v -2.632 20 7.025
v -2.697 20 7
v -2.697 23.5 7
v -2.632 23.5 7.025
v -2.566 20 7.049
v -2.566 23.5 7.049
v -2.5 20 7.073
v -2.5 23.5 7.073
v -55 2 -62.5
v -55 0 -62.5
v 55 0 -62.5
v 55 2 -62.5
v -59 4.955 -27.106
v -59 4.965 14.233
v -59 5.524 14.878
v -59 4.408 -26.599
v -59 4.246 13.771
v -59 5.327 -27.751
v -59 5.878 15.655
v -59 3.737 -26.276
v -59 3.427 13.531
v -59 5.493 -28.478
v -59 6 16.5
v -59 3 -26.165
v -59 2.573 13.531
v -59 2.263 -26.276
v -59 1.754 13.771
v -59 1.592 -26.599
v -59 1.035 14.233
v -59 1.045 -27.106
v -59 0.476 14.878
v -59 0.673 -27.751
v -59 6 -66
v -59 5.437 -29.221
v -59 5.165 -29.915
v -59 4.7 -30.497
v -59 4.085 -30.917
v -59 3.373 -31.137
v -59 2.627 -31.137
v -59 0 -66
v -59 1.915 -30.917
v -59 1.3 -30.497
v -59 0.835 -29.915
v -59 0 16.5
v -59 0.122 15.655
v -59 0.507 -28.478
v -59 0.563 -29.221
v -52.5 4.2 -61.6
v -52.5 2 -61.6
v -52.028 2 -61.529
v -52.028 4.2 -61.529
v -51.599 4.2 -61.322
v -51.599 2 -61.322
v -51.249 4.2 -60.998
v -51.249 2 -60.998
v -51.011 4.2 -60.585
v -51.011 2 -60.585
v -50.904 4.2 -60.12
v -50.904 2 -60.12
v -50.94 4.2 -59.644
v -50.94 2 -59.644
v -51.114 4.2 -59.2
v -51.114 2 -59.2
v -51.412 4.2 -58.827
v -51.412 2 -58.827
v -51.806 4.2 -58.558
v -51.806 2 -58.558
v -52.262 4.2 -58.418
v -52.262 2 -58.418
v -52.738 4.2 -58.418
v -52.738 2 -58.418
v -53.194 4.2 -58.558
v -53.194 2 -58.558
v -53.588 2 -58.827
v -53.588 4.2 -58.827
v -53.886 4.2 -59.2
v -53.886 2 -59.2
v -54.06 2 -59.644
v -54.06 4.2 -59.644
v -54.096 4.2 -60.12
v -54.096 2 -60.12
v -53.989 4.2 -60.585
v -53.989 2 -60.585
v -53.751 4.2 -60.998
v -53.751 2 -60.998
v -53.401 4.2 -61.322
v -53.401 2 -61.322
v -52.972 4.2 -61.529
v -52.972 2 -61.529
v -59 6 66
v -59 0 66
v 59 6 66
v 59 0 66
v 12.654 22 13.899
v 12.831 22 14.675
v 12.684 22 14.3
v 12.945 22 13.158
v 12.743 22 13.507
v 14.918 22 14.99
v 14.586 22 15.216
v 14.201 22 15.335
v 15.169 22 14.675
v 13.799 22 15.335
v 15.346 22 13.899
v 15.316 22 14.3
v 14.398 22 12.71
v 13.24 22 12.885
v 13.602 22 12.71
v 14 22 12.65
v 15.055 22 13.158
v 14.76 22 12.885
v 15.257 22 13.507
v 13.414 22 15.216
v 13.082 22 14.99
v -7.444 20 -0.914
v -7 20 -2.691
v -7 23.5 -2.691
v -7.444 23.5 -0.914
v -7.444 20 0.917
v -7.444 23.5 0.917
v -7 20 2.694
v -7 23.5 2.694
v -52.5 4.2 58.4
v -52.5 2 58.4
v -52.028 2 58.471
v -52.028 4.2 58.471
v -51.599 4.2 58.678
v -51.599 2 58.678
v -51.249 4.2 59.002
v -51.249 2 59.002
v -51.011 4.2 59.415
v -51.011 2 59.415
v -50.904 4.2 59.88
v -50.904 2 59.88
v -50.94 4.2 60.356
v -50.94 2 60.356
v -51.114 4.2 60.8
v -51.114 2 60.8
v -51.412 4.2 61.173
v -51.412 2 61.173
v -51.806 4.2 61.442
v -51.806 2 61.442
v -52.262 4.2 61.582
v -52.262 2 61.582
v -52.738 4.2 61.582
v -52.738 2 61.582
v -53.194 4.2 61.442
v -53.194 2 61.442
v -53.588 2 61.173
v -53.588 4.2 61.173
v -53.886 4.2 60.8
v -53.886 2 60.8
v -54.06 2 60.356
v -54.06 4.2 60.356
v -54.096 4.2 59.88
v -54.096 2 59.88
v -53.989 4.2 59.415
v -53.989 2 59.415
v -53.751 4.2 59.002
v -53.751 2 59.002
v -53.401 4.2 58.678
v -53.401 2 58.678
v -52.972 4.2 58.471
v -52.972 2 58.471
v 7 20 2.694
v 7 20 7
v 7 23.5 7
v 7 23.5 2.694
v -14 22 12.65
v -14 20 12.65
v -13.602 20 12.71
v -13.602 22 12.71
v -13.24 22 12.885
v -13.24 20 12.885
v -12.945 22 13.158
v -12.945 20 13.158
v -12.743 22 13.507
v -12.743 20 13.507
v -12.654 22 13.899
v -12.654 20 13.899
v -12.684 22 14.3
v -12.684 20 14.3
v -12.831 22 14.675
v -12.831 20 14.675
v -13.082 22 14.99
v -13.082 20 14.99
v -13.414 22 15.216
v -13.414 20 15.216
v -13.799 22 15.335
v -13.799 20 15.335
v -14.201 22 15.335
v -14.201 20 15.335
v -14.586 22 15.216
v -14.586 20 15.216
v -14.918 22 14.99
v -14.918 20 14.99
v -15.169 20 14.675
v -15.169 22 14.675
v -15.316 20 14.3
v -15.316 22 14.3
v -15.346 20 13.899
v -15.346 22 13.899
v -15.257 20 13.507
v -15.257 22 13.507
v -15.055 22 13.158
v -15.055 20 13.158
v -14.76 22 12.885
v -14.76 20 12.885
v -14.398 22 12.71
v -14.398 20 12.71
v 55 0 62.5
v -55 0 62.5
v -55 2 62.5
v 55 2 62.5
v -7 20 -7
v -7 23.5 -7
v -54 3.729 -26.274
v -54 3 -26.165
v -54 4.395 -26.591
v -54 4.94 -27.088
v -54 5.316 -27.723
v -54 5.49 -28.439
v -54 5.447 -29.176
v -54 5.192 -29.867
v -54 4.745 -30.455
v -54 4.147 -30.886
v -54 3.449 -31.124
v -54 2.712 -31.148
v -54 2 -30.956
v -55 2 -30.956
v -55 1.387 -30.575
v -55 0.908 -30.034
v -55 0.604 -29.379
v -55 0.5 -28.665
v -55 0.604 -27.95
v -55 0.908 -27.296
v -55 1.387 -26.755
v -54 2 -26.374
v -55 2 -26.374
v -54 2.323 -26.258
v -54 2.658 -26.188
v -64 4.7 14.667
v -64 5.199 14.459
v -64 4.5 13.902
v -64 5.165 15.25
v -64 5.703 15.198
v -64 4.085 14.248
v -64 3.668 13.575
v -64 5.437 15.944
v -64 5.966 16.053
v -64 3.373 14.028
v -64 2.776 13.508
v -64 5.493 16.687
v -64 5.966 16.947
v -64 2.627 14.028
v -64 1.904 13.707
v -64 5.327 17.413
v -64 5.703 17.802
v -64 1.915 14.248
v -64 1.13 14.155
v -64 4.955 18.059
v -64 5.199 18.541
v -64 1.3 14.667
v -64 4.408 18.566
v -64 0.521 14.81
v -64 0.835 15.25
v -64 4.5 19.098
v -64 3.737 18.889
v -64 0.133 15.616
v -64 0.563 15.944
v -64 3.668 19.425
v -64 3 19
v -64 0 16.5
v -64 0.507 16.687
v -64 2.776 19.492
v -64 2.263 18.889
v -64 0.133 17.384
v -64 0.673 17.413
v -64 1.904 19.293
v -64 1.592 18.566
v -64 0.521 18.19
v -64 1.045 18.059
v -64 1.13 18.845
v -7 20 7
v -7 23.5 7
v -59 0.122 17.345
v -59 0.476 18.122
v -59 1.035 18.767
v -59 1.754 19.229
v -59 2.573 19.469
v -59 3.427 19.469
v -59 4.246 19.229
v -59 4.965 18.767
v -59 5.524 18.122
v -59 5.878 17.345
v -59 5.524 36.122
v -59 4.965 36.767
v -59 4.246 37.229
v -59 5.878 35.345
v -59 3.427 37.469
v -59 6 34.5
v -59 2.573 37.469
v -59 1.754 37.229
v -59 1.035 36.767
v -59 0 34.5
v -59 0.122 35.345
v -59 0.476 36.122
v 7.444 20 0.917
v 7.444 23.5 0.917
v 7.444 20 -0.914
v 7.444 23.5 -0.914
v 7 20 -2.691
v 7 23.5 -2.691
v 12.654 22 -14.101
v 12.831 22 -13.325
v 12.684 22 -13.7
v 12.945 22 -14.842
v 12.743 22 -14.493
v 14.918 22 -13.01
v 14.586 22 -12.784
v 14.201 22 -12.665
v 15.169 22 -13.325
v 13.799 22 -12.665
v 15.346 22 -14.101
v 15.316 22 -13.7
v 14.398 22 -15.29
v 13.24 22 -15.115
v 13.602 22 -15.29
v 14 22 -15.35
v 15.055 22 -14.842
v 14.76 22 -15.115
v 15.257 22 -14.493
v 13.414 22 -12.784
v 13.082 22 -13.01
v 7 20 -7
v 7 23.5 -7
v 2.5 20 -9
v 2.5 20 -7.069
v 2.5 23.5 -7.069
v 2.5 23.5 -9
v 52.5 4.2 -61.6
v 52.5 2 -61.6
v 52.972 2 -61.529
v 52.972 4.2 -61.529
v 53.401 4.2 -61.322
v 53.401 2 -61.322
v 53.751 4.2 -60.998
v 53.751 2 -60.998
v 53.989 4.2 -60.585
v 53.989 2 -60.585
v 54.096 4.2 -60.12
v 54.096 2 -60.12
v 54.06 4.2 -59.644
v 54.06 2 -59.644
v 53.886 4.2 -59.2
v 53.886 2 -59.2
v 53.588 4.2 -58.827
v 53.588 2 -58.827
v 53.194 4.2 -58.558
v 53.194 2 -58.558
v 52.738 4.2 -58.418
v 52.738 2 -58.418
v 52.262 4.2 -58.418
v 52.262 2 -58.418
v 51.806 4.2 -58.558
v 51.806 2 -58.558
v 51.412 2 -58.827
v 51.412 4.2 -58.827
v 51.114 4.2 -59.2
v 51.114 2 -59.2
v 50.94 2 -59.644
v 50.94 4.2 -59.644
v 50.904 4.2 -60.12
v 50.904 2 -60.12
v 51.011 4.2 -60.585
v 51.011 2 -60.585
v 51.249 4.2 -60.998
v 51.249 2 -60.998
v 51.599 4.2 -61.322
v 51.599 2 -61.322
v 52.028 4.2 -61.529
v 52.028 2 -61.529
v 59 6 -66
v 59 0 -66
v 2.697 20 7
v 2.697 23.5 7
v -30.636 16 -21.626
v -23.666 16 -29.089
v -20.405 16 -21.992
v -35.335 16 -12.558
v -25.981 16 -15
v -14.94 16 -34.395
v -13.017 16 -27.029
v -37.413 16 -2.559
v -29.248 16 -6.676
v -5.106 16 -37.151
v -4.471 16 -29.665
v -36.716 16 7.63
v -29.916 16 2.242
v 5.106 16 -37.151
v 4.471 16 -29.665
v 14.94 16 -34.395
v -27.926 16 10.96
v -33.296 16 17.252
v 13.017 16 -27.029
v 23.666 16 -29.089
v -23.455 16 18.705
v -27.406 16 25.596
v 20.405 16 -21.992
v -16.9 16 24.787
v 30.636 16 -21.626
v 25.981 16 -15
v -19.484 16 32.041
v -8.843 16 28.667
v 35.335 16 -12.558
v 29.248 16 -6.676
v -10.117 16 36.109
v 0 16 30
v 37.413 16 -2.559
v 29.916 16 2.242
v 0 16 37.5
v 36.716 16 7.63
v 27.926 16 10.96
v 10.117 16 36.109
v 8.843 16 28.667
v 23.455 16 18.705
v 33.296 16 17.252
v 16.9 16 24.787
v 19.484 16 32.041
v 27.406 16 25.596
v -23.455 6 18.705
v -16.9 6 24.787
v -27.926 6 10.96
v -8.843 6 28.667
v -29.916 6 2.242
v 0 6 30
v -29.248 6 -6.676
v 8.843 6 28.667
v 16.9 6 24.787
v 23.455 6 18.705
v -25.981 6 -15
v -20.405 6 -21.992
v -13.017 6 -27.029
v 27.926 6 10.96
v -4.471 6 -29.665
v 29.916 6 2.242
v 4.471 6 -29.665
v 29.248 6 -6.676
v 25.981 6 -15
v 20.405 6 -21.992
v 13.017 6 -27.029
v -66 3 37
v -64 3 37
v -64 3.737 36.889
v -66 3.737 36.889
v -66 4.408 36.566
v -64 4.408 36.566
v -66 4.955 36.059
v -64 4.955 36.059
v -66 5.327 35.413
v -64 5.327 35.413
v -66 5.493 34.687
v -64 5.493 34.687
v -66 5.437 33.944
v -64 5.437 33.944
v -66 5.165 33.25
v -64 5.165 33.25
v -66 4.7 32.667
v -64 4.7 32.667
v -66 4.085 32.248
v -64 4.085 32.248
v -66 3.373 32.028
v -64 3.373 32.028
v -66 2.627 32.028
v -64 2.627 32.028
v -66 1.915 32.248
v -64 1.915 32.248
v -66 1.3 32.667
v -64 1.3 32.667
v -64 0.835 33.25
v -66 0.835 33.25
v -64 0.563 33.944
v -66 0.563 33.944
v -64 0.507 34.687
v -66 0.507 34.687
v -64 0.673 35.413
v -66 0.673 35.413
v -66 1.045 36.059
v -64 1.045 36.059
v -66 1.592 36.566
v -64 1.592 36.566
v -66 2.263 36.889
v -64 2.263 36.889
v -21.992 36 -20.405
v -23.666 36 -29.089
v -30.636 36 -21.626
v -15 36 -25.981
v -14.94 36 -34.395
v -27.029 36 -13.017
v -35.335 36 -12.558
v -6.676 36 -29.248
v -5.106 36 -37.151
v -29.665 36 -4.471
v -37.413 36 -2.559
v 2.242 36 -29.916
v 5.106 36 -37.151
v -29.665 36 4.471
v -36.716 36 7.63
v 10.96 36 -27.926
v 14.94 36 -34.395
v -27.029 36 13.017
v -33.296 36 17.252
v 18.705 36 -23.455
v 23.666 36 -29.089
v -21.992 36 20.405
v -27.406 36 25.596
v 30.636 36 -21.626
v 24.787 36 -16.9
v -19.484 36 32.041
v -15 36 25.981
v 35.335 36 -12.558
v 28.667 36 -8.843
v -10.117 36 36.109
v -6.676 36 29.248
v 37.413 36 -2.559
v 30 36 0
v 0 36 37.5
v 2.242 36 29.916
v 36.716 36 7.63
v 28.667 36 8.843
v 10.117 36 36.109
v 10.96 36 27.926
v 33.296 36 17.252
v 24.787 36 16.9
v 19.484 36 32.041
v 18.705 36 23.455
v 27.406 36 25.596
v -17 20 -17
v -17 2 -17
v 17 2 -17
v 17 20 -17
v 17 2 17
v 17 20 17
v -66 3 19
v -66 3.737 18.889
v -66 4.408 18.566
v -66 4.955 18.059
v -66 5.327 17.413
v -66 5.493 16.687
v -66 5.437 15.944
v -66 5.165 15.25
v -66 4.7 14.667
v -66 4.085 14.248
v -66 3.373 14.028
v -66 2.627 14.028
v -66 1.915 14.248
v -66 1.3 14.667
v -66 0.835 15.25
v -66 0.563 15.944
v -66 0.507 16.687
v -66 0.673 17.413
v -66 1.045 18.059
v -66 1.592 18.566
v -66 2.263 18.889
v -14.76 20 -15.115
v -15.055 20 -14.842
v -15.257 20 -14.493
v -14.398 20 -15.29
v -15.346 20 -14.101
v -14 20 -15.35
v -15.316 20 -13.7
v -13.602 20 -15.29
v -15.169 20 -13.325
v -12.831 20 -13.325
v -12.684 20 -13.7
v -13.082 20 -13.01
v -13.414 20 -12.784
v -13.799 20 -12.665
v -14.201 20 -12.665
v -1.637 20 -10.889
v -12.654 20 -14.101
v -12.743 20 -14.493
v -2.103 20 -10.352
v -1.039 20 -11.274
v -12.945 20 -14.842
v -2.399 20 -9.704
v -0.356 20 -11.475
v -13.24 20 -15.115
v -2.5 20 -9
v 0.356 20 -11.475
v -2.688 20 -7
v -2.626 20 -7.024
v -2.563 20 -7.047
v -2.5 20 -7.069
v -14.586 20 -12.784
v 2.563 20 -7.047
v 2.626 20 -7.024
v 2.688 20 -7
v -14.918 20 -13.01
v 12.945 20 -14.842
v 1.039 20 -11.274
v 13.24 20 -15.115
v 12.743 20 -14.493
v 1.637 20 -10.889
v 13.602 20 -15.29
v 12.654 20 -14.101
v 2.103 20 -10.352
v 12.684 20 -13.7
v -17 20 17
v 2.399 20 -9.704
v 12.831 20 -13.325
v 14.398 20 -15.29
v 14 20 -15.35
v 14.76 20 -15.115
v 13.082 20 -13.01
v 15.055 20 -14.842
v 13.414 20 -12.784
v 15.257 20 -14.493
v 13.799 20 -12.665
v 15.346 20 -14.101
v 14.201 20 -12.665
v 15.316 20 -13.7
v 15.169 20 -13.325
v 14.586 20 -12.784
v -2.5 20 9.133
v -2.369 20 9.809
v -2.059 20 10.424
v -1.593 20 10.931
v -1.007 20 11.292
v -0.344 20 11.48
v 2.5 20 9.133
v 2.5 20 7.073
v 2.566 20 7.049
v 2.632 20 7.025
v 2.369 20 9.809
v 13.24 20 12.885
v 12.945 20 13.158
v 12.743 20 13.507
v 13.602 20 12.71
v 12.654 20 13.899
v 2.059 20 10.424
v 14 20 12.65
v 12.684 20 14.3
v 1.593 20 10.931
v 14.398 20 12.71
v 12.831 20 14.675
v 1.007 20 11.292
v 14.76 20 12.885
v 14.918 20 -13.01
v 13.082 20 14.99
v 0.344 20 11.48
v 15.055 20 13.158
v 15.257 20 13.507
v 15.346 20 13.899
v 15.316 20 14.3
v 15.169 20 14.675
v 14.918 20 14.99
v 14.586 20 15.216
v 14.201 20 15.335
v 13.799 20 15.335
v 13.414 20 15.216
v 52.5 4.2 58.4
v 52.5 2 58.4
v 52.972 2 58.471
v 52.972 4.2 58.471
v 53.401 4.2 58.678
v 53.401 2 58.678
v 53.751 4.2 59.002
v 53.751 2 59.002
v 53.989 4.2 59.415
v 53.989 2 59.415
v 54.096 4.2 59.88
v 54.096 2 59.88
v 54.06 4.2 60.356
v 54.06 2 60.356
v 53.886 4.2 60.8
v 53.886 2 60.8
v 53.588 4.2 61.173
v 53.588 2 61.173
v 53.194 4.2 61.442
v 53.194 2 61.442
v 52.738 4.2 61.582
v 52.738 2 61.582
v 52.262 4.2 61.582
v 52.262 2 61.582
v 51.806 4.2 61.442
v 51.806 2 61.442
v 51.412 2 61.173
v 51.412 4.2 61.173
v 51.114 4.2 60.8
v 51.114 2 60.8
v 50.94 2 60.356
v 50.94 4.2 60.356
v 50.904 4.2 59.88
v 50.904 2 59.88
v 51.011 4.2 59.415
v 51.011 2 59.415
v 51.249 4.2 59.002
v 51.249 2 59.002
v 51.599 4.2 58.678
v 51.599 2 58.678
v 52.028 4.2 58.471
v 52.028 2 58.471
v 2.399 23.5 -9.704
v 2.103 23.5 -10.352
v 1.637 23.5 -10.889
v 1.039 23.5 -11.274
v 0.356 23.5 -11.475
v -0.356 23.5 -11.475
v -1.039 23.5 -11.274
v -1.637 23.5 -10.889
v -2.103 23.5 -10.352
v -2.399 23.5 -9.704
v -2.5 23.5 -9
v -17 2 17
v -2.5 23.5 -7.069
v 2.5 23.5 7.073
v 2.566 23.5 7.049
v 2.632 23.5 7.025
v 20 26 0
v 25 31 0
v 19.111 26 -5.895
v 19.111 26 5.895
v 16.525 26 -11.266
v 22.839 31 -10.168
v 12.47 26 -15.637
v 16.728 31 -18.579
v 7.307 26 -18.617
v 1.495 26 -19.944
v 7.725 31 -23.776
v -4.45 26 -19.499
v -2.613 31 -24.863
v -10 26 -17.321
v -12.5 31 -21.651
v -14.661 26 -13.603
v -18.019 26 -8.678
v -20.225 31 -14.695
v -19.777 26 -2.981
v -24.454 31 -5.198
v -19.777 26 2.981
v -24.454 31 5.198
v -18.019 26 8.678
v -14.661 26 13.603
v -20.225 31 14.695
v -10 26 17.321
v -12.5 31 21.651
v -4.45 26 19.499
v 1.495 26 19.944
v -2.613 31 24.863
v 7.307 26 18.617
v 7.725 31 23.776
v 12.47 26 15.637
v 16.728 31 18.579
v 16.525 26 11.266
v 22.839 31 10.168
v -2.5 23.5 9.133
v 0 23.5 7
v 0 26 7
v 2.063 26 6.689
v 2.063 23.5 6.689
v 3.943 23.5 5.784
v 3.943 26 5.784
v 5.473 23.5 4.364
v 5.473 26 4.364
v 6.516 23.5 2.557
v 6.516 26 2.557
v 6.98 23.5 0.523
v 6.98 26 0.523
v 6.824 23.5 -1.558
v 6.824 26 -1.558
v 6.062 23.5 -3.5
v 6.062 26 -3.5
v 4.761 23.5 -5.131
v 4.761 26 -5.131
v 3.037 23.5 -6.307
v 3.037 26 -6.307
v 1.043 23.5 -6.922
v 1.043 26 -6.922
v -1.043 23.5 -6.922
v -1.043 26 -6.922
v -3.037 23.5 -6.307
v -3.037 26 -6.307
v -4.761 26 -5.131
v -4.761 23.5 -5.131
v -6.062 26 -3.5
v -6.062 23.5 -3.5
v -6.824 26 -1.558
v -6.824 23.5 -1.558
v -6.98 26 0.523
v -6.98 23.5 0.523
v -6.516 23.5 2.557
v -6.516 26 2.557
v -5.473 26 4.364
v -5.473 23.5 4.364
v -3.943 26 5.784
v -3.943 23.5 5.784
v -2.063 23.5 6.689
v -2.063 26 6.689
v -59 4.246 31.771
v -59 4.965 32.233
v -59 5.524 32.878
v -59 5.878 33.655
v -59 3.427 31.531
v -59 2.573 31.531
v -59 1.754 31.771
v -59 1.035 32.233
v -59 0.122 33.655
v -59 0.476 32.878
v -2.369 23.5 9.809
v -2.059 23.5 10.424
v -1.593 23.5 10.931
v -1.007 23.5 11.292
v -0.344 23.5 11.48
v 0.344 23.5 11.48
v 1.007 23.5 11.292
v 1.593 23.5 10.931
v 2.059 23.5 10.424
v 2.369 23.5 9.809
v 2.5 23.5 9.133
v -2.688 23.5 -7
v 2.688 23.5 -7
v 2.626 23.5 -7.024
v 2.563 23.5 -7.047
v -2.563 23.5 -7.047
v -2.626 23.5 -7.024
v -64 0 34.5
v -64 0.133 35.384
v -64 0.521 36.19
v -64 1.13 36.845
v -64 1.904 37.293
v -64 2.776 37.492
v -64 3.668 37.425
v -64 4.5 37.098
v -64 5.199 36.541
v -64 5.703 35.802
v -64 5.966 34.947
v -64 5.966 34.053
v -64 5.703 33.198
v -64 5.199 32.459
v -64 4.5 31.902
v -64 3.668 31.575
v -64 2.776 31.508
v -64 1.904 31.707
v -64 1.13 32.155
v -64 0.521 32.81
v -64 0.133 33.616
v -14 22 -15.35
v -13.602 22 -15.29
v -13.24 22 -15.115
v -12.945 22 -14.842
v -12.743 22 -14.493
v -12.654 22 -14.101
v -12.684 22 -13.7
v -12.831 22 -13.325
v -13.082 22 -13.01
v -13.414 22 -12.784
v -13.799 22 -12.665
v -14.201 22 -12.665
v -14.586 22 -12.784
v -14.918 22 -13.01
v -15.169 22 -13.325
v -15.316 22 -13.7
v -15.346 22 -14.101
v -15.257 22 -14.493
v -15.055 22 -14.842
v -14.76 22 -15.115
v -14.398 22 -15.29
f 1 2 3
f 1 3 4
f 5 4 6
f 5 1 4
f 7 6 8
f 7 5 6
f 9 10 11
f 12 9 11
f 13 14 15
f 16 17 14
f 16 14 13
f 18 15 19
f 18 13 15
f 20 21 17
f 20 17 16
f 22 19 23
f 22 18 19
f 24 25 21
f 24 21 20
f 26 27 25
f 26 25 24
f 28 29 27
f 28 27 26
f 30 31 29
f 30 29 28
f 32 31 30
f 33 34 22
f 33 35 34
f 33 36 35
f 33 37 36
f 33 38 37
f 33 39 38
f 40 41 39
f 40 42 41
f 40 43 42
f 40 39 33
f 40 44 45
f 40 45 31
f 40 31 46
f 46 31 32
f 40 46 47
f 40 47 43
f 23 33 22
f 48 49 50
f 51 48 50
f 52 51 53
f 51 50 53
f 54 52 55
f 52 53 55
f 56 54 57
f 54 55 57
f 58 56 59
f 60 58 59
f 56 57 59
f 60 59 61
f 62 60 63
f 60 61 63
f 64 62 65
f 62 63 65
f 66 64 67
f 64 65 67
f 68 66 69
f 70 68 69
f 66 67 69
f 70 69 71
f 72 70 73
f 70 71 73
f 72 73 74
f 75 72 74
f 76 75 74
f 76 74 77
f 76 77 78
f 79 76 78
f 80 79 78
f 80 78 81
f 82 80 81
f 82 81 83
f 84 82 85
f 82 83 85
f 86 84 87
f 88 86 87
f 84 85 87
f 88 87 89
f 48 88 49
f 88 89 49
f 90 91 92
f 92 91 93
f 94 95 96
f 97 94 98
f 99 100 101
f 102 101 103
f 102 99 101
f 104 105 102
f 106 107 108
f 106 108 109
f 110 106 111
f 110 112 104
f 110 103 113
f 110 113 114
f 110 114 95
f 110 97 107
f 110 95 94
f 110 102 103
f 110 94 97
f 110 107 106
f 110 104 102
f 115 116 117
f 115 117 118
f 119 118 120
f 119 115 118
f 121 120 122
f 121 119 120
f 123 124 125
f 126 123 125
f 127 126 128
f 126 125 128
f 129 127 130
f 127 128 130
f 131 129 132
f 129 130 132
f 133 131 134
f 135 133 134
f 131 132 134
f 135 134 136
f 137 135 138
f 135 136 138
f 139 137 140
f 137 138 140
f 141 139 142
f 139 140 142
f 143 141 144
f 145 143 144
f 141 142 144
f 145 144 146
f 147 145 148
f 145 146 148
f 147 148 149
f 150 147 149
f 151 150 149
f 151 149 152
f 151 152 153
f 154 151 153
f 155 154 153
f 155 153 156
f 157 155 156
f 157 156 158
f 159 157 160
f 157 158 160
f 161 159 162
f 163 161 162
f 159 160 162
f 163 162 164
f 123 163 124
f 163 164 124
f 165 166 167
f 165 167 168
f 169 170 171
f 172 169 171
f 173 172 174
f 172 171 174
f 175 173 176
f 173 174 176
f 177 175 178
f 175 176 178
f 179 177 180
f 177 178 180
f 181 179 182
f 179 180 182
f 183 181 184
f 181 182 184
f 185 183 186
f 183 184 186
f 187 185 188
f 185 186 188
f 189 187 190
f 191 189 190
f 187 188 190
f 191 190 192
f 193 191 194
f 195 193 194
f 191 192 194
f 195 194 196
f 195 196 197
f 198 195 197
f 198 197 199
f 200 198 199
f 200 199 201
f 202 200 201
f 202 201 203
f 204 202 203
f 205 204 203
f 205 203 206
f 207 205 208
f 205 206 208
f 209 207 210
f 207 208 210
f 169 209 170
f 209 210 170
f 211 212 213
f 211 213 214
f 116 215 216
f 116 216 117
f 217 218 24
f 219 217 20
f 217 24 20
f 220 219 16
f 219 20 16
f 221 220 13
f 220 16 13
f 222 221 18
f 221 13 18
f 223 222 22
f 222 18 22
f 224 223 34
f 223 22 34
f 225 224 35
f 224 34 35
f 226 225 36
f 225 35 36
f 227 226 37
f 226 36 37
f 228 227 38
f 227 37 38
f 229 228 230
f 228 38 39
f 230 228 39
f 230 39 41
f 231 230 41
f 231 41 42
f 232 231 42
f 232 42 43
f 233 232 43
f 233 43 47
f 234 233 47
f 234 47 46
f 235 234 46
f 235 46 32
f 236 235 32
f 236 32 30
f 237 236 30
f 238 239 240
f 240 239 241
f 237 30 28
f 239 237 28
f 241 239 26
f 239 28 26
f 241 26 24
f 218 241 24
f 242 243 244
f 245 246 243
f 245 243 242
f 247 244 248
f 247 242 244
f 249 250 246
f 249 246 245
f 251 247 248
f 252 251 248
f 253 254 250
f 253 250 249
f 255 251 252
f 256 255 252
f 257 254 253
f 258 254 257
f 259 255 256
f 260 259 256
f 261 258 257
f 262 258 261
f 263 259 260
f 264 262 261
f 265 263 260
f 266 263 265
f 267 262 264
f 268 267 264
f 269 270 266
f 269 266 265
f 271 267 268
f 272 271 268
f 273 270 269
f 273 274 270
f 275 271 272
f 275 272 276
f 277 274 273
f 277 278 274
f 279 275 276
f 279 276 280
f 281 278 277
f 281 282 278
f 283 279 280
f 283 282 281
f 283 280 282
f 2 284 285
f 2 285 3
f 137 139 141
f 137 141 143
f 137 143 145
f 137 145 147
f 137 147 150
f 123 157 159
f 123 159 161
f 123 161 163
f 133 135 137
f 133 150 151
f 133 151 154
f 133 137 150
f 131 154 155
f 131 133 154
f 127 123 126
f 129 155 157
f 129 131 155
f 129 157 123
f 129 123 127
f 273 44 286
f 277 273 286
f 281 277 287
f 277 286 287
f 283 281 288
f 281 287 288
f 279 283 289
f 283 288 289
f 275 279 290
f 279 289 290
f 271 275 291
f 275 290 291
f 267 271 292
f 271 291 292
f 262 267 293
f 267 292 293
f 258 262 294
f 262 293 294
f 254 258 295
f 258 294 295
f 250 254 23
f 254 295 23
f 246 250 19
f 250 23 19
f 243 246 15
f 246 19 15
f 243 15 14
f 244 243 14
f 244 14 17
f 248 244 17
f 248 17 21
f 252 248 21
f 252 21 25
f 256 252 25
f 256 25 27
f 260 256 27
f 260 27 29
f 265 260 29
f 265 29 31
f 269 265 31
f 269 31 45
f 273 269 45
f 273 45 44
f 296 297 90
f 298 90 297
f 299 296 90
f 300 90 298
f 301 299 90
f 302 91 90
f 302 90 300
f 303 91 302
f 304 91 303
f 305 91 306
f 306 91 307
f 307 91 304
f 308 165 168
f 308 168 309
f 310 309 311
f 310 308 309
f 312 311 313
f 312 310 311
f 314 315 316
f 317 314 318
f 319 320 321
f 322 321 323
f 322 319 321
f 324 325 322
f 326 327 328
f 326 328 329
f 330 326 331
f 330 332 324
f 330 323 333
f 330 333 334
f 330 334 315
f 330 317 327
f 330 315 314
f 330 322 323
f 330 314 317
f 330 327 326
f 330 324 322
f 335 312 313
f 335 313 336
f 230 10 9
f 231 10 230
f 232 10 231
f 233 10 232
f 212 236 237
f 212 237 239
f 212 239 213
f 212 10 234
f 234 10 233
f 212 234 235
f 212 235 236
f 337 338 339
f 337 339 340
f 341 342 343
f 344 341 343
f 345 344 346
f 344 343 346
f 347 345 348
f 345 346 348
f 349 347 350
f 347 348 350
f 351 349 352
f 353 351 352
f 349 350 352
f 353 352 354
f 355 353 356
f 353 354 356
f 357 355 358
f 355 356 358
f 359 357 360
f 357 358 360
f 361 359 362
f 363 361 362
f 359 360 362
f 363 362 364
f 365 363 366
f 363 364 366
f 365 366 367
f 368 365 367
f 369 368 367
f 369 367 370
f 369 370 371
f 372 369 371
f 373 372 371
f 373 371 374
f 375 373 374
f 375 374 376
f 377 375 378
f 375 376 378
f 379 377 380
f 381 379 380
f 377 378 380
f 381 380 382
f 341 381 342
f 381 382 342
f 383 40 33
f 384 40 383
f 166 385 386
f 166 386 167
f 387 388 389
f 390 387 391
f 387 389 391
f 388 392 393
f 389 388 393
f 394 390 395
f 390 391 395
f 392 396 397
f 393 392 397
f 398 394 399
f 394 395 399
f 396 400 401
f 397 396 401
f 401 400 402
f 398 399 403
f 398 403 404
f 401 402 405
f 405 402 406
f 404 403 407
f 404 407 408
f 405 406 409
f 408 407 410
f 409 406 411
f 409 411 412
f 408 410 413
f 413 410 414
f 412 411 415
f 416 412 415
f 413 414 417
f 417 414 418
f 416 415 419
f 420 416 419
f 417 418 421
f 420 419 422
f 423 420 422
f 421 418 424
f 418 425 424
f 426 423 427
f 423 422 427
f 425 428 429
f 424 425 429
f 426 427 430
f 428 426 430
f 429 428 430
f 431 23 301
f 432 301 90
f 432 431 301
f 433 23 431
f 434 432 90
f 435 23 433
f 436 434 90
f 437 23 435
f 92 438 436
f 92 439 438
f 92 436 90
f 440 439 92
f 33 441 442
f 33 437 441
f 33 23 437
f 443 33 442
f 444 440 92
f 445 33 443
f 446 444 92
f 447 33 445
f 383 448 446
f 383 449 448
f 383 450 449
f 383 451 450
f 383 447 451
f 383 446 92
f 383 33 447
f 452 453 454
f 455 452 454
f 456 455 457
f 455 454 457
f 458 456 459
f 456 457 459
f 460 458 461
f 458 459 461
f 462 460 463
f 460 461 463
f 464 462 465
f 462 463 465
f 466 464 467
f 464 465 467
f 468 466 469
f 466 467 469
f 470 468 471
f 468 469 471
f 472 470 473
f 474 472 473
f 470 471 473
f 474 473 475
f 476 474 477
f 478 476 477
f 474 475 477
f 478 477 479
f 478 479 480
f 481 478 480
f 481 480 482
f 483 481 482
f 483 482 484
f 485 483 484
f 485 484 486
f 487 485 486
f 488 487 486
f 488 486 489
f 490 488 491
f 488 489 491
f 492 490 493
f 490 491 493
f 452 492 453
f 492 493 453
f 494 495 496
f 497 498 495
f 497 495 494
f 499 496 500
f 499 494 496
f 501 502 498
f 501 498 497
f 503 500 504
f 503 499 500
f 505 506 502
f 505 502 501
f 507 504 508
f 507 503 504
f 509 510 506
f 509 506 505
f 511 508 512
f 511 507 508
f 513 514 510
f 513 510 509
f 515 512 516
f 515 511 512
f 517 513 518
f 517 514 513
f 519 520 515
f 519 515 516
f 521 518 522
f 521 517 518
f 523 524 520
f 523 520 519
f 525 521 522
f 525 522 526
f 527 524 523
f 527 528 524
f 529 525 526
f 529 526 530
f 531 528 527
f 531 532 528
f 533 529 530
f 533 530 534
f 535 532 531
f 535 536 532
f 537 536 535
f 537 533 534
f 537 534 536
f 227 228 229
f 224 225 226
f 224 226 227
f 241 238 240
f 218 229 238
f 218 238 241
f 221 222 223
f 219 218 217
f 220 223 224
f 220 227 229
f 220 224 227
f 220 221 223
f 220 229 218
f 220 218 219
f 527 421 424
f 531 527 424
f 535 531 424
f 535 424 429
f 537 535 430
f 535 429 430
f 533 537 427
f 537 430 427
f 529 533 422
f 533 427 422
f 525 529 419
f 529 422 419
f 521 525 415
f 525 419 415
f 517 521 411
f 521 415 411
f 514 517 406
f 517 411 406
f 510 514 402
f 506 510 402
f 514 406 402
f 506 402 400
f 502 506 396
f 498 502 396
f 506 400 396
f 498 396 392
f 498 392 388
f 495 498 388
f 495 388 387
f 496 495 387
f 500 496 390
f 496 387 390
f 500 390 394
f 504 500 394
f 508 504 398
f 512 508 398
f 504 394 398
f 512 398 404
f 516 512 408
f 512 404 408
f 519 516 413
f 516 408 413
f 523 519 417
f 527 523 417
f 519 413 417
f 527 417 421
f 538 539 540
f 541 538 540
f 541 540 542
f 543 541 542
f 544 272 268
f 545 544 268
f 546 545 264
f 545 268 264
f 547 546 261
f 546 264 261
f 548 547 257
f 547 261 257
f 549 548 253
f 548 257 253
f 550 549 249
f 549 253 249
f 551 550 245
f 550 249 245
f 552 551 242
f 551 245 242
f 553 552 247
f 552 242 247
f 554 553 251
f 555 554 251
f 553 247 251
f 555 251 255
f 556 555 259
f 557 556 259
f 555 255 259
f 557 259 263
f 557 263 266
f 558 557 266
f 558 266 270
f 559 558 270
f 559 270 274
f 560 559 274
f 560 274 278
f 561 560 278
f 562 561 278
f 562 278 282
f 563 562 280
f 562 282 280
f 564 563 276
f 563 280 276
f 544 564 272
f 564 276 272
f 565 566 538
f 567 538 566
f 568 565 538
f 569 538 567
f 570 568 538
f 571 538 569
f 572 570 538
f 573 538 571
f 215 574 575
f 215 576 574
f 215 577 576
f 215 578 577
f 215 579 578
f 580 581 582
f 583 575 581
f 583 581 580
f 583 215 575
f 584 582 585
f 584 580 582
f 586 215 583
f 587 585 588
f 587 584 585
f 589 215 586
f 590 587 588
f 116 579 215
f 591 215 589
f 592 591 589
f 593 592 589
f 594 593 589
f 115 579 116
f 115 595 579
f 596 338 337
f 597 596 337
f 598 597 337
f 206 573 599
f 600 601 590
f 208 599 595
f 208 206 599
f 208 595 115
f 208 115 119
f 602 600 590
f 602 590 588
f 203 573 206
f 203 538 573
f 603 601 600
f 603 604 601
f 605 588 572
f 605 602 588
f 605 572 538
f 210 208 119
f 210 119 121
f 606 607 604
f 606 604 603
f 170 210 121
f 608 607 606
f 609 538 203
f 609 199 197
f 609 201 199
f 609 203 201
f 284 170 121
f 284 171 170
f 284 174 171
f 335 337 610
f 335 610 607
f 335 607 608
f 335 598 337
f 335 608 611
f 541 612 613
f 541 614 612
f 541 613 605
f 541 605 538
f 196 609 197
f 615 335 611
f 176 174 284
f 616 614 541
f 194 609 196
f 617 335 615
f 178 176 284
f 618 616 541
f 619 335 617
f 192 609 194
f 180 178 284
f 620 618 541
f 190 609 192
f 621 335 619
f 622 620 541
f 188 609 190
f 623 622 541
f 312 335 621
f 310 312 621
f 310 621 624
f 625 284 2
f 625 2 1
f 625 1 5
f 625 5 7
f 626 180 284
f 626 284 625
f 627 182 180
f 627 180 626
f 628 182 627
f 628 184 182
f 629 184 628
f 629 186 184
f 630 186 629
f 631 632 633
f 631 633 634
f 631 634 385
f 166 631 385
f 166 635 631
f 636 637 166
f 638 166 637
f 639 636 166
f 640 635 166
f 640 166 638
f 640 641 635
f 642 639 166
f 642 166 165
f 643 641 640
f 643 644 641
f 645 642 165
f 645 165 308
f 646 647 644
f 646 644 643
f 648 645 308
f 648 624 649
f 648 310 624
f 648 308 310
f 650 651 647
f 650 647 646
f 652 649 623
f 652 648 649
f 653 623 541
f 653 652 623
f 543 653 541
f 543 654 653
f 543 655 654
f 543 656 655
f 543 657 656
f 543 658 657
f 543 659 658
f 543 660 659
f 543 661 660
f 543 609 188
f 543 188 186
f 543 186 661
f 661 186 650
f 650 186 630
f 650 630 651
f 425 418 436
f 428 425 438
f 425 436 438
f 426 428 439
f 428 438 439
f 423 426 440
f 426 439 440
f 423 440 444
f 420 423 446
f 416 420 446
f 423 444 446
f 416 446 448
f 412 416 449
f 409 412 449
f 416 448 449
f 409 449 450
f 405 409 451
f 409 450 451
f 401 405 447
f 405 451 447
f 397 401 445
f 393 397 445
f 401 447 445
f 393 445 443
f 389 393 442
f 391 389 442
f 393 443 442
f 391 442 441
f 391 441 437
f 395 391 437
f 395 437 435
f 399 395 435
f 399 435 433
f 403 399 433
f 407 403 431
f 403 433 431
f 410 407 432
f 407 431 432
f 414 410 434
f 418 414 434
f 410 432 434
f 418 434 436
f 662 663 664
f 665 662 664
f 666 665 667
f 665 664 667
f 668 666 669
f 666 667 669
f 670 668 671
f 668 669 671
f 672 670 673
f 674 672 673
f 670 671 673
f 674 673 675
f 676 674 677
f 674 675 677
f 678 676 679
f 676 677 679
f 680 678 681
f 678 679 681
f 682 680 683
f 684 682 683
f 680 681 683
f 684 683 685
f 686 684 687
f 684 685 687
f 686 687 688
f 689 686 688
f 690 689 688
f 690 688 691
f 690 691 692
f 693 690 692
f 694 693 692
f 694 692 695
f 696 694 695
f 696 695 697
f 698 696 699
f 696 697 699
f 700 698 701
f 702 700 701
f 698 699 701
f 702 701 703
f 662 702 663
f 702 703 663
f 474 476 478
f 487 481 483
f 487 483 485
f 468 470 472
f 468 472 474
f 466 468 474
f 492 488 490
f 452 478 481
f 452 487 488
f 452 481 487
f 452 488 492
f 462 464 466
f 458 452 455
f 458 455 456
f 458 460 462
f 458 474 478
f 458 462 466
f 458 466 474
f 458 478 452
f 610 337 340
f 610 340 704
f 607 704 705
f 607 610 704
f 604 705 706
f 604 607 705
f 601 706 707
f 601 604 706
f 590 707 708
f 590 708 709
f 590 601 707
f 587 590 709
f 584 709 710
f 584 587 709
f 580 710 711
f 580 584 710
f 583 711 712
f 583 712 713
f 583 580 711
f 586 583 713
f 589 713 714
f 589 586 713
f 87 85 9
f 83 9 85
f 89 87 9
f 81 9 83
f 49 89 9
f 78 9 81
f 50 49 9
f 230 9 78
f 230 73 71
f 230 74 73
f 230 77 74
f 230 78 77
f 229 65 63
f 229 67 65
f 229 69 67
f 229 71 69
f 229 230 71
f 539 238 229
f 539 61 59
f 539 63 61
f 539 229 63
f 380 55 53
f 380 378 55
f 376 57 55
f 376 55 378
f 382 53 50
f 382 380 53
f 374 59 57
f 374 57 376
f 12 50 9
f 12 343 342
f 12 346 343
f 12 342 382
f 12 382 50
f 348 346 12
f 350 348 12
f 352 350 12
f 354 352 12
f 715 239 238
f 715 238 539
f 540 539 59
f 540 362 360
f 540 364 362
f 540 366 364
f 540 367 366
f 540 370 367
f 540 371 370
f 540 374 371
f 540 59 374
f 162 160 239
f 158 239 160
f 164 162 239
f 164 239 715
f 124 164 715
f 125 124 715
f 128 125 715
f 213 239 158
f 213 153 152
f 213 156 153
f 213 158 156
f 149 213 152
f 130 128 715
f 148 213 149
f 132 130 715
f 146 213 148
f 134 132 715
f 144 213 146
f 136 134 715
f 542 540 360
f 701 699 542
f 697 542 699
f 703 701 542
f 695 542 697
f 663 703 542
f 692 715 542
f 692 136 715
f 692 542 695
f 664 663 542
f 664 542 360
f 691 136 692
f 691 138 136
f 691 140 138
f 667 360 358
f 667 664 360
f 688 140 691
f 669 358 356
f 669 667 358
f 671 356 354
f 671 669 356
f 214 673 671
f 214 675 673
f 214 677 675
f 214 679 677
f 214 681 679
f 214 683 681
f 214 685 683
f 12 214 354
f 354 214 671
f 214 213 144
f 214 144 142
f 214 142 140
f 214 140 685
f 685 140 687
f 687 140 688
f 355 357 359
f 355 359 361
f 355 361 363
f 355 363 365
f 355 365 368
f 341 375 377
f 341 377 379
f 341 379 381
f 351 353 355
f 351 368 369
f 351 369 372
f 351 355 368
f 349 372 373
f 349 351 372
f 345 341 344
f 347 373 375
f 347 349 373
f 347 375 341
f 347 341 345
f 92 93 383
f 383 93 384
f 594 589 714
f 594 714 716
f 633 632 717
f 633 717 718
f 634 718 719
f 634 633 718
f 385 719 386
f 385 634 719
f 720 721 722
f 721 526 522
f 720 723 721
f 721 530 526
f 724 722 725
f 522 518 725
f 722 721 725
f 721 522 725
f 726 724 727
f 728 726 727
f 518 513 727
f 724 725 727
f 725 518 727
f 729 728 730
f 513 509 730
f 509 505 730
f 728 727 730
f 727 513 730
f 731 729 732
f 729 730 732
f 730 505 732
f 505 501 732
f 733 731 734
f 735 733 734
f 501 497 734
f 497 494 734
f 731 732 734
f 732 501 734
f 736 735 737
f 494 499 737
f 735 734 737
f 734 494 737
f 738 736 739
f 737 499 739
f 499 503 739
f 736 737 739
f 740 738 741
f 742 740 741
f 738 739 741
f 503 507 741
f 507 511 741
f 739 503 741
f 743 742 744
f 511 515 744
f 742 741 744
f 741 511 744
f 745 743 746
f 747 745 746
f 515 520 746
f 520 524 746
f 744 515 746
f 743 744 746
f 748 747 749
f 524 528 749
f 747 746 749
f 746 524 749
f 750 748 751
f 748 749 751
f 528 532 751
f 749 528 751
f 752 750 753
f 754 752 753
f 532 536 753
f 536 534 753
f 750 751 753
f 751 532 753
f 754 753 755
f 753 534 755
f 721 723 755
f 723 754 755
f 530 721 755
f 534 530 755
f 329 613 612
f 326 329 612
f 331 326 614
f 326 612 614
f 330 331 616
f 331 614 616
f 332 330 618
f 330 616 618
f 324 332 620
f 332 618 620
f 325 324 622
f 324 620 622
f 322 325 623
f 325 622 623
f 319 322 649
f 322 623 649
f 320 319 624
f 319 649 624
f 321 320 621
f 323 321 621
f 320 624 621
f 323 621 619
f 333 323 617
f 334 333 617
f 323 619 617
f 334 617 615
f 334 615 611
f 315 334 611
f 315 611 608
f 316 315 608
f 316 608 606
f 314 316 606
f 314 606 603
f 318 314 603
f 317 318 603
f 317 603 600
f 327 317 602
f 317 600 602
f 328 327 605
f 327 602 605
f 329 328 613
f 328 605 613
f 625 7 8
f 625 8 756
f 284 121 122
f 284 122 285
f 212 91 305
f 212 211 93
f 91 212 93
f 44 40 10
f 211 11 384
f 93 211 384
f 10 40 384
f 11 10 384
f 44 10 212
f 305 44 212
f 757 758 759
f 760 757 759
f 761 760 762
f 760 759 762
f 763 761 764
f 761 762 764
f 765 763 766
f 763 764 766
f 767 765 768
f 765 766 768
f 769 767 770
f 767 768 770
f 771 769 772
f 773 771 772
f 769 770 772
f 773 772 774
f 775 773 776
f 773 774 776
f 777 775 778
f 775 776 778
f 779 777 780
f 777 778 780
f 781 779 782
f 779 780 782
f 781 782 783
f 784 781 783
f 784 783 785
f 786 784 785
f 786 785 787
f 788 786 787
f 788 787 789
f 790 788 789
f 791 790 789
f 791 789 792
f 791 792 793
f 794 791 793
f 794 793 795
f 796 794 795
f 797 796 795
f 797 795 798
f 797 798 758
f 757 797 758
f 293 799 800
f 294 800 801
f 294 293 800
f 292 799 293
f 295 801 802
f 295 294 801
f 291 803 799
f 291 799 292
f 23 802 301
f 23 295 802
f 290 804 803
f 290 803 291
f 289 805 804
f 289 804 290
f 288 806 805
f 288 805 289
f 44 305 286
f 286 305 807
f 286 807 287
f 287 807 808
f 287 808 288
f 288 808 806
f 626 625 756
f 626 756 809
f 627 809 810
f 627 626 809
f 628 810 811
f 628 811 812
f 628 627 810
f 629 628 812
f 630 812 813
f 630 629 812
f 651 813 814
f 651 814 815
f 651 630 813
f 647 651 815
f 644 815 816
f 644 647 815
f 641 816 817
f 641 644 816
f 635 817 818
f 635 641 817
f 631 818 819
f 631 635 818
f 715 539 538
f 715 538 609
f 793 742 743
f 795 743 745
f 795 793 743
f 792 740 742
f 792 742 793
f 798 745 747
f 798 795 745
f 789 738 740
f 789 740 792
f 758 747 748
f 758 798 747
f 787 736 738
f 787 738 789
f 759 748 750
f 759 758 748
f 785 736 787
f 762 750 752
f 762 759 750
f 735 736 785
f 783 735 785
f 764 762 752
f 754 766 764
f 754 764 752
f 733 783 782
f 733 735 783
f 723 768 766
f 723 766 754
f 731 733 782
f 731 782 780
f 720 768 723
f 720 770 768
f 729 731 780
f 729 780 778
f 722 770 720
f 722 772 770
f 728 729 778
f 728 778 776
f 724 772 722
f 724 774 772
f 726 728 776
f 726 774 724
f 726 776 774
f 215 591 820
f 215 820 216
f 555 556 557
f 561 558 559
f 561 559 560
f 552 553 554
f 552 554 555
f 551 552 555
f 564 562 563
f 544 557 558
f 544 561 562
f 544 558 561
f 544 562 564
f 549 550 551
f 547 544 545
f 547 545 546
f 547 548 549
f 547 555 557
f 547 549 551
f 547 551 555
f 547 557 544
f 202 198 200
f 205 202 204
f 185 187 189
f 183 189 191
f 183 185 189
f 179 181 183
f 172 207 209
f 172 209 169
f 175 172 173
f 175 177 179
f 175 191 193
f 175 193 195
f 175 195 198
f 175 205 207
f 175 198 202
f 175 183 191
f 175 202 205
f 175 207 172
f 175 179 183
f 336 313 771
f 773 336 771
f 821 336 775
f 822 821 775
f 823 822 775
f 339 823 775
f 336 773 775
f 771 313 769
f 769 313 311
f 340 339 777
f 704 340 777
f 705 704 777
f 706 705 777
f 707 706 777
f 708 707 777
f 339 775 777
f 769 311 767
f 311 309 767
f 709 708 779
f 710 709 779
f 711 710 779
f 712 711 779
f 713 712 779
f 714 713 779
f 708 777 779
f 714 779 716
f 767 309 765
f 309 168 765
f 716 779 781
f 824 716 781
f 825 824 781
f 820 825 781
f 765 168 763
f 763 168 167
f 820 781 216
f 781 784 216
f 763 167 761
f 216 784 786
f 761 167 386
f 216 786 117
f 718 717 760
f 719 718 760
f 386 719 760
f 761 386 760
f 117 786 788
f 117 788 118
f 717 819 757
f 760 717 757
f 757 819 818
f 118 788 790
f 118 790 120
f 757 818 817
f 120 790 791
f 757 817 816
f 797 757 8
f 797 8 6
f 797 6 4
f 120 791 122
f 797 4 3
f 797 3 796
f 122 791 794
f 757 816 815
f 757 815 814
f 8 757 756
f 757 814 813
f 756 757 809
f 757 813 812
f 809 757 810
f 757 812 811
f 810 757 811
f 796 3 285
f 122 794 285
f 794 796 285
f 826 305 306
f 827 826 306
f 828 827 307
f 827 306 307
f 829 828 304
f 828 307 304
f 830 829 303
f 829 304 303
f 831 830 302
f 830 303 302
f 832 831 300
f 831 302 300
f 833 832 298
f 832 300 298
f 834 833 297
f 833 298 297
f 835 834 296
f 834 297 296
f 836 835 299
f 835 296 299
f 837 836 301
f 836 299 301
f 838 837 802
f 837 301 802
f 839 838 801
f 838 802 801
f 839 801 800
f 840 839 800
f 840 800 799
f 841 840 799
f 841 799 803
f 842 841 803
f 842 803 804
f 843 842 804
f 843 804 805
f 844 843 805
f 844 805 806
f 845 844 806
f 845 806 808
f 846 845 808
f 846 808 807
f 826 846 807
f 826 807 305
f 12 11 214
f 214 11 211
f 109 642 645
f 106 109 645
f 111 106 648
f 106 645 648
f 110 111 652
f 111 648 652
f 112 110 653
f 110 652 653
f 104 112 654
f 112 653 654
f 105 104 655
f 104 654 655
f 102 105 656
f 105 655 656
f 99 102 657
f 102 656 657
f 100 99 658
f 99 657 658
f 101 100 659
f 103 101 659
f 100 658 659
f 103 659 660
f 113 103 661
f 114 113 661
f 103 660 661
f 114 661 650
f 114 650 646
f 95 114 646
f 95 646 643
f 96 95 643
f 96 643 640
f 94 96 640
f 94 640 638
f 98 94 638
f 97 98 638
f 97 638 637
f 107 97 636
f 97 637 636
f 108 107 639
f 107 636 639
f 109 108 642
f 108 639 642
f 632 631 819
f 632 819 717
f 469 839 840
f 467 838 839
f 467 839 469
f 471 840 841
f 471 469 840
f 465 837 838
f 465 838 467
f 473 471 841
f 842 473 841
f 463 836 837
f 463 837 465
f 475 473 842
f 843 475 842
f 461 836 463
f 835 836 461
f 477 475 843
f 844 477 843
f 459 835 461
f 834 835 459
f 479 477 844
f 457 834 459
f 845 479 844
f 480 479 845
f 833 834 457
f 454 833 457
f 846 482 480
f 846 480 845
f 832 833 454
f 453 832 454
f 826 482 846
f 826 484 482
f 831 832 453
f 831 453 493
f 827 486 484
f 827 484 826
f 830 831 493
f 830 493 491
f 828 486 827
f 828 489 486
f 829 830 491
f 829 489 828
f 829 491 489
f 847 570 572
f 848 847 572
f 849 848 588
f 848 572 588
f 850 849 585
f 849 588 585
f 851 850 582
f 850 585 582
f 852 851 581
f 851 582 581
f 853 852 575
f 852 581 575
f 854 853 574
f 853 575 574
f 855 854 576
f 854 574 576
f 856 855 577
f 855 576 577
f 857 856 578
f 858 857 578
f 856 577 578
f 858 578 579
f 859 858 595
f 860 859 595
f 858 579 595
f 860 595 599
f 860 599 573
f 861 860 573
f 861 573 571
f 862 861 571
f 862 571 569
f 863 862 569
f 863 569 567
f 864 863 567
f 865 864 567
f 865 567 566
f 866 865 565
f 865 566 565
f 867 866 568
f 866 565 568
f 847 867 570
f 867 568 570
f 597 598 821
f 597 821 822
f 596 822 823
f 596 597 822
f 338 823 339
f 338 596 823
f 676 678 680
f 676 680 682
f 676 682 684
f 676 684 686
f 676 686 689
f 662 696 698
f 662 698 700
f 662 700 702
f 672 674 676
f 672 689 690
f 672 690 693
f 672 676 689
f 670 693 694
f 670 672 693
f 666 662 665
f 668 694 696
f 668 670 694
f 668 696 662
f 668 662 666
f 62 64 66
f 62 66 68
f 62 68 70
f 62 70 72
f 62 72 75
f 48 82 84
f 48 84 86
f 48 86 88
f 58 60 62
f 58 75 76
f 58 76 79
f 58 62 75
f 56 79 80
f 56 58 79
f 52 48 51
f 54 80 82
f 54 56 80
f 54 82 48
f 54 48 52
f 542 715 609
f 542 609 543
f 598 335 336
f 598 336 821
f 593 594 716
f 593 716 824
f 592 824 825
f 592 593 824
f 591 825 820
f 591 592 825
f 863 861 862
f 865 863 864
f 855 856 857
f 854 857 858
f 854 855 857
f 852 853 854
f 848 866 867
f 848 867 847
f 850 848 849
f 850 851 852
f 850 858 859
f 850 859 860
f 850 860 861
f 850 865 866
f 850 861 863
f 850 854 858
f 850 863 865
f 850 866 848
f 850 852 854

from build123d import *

# Parameters (mm, degrees)
SKETCH_1_W          = 118
SKETCH_1_H          = 132
EXTRUDE_1_DEPTH     = 6
SKETCH_2_W          = 110
SKETCH_2_H          = 125
CUT_EXTRUDE_1_DEPTH = 2
SKETCH_3_R          = 30
EXTRUDE_2_DEPTH     = 10
SKETCH_4_R          = 37.5
EXTRUDE_3_DEPTH     = 20
SKETCH_6_R          = 20
SKETCH_7_R          = 30
SKETCH_8_R          = 1.6
CUT_EXTRUDE_2_DEPTH = 2.2
SKETCH_10_W         = 34
SKETCH_10_H         = 34
CUT_EXTRUDE_3_DEPTH = 18
CUT_EXTRUDE_4_DEPTH = 3.5
SKETCH_12_R         = 7
CUT_EXTRUDE_5_DEPTH = 93.265920036
SKETCH_13_R         = 1.35
CUT_EXTRUDE_6_DEPTH = 2
SKETCH_14_R         = 3
EXTRUDE_4_DEPTH     = 5
SKETCH_15_R         = 2.5
EXTRUDE_5_DEPTH     = 2
SKETCH_16_R         = 2.5
CUT_EXTRUDE_7_DEPTH = 5


with BuildPart() as part:
    # 草图1 → 凸台-拉伸1 (new body)
    with BuildSketch(Plane(origin=(0, 0, 0), x_dir=(1, 0, 0), z_dir=(0, 1, 0))):
        Rectangle(SKETCH_1_W, SKETCH_1_H)
    extrude(amount=EXTRUDE_1_DEPTH)

    # 草图2 → 切除-拉伸1 (cut)
    with BuildSketch(Plane.XZ):
        Rectangle(SKETCH_2_W, SKETCH_2_H)
    extrude(amount=-CUT_EXTRUDE_1_DEPTH, mode=Mode.SUBTRACT)

    # 草图3 → 凸台-拉伸2 (add)
    with BuildSketch(Plane(origin=(0, 6, 0), x_dir=(1, 0, 0), z_dir=(0, 1, 0))):
        with Locations(Location((0, 0, 0), (0, 0, 270))):
            Circle(SKETCH_3_R)
    extrude(amount=EXTRUDE_2_DEPTH)

    # 草图4 → 凸台-拉伸3 (add)
    with BuildSketch(Plane(origin=(0, 16, 0), x_dir=(1, 0, 0), z_dir=(0, 1, 0))):
        with Locations(Location((0, 0, 0), (0, 0, 270))):
            Circle(SKETCH_4_R)
    extrude(amount=EXTRUDE_3_DEPTH)

    # 草图6 → 切除-放样2 section 0
    with BuildSketch(Plane(origin=(0, 26, 0), x_dir=(1, 0, 0), z_dir=(0, 1, 0))):
        Circle(SKETCH_6_R)
    # 草图7 → 切除-放样2 section 1
    with BuildSketch(Plane(origin=(0, 36, 0), x_dir=(1, 0, 0), z_dir=(0, 1, 0))):
        Circle(SKETCH_7_R)
    loft(mode=Mode.SUBTRACT)

    # 草图8 → 切除-拉伸2 (cut)
    with BuildSketch(Plane.XZ.offset(-2)):
        with Locations(Location((52.5, 60, 0), (0, 0, 270))):
            Circle(SKETCH_8_R)
        with Locations(Location((52.5, -60, 0), (0, 0, 270))):
            Circle(SKETCH_8_R)
        with Locations(Location((-52.5, -60, 0), (0, 0, 270))):
            Circle(SKETCH_8_R)
        with Locations(Location((-52.5, 60, 0), (0, 0, 270))):
            Circle(SKETCH_8_R)
    extrude(amount=-CUT_EXTRUDE_2_DEPTH, mode=Mode.SUBTRACT)

    # 草图10 → 切除-拉伸3 (cut)
    with BuildSketch(Plane.XZ.offset(-2)):
        Rectangle(SKETCH_10_W, SKETCH_10_H)
    extrude(amount=-CUT_EXTRUDE_3_DEPTH, mode=Mode.SUBTRACT)

    # 草图11 → 切除-拉伸4 (cut)
    with BuildSketch(Plane.XZ.offset(-20)):
        with BuildLine():
            Line((-2.687978229, -7), (-7, -7))
            Line((-7, -7), (-7, -2.690813124))
            ThreePointArc((-7, -2.690813124), (-7.5, 0.001769279), (-7, 2.694351683))
            Line((-7, 2.694351683), (-7, 7))
            Line((-7, 7), (-2.697177558, 7))
            ThreePointArc((-2.697177558, 7), (-2.598843965, 7.03710936), (-2.5, 7.072837091))
            Line((-2.5, 7.072837091), (-2.5, 9.133061324))
            ThreePointArc((-2.5, 9.133061324), (0, 11.503538559), (2.5, 9.133061324))
            Line((2.5, 9.133061324), (2.5, 7.072837091))
            ThreePointArc((2.5, 7.072837091), (2.598843965, 7.03710936), (2.697177558, 7))
            Line((2.697177558, 7), (7, 7))
            Line((7, 7), (7, 2.694351683))
            ThreePointArc((7, 2.694351683), (7.5, 0.001769279), (7, -2.690813124))
            Line((7, -2.690813124), (7, -7))
            Line((7, -7), (2.687978229, -7))
            ThreePointArc((2.687978229, -7), (2.594220518, -7.035276969), (2.5, -7.069298532))
            Line((2.5, -7.069298532), (2.5, -9))
            ThreePointArc((2.5, -9), (0, -11.5), (-2.5, -9))
            Line((-2.5, -9), (-2.5, -7.069298532))
            ThreePointArc((-2.5, -7.069298532), (-2.594220518, -7.035276969), (-2.687978229, -7))
        make_face()
    extrude(amount=-CUT_EXTRUDE_4_DEPTH, mode=Mode.SUBTRACT)

    # 草图12 → 切除-拉伸5 (cut, through all)
    with BuildSketch(Plane(origin=(0, 26, 0), x_dir=(1, 0, 0), z_dir=(0, 1, 0))):
        with Locations(Location((0, 0, 0), (0, 0, 270))):
            Circle(SKETCH_12_R)
    extrude(amount=-CUT_EXTRUDE_5_DEPTH, mode=Mode.SUBTRACT)

    # 草图13 → 切除-拉伸6 (cut)
    with BuildSketch(Plane.XZ.offset(-20)):
        with Locations(Location((-14, 14, 0), (0, 0, 270))):
            Circle(SKETCH_13_R)
        with Locations(Location((14, 14, 0), (0, 0, 270))):
            Circle(SKETCH_13_R)
        with Locations(Location((14, -14, 0), (0, 0, 270))):
            Circle(SKETCH_13_R)
        with Locations(Location((-14, -14, 0), (0, 0, 270))):
            Circle(SKETCH_13_R)
    extrude(amount=-CUT_EXTRUDE_6_DEPTH, mode=Mode.SUBTRACT)

    # 草图14 → 凸台-拉伸4 (add)
    with BuildSketch(Plane.ZY.offset(59)):
        with Locations(Location((34.5, 3, 0), (0, 0, 270))):
            Circle(SKETCH_14_R)
        with Locations(Location((16.5, 3, 0), (0, 0, 270))):
            Circle(SKETCH_14_R)
    extrude(amount=EXTRUDE_4_DEPTH)

    # 草图15 → 凸台-拉伸5 (add)
    with BuildSketch(Plane.ZY.offset(64)):
        with Locations((16.5, 3)):
            Circle(SKETCH_15_R)
        with Locations((34.5, 3)):
            Circle(SKETCH_15_R)
    extrude(amount=EXTRUDE_5_DEPTH)

    # 草图16 → 切除-拉伸7 (cut)
    with BuildSketch(Plane.ZY.offset(59)):
        with Locations((-28.664816868, 3)):
            Circle(SKETCH_16_R)
    extrude(amount=-CUT_EXTRUDE_7_DEPTH, mode=Mode.SUBTRACT)


solid = part.part
